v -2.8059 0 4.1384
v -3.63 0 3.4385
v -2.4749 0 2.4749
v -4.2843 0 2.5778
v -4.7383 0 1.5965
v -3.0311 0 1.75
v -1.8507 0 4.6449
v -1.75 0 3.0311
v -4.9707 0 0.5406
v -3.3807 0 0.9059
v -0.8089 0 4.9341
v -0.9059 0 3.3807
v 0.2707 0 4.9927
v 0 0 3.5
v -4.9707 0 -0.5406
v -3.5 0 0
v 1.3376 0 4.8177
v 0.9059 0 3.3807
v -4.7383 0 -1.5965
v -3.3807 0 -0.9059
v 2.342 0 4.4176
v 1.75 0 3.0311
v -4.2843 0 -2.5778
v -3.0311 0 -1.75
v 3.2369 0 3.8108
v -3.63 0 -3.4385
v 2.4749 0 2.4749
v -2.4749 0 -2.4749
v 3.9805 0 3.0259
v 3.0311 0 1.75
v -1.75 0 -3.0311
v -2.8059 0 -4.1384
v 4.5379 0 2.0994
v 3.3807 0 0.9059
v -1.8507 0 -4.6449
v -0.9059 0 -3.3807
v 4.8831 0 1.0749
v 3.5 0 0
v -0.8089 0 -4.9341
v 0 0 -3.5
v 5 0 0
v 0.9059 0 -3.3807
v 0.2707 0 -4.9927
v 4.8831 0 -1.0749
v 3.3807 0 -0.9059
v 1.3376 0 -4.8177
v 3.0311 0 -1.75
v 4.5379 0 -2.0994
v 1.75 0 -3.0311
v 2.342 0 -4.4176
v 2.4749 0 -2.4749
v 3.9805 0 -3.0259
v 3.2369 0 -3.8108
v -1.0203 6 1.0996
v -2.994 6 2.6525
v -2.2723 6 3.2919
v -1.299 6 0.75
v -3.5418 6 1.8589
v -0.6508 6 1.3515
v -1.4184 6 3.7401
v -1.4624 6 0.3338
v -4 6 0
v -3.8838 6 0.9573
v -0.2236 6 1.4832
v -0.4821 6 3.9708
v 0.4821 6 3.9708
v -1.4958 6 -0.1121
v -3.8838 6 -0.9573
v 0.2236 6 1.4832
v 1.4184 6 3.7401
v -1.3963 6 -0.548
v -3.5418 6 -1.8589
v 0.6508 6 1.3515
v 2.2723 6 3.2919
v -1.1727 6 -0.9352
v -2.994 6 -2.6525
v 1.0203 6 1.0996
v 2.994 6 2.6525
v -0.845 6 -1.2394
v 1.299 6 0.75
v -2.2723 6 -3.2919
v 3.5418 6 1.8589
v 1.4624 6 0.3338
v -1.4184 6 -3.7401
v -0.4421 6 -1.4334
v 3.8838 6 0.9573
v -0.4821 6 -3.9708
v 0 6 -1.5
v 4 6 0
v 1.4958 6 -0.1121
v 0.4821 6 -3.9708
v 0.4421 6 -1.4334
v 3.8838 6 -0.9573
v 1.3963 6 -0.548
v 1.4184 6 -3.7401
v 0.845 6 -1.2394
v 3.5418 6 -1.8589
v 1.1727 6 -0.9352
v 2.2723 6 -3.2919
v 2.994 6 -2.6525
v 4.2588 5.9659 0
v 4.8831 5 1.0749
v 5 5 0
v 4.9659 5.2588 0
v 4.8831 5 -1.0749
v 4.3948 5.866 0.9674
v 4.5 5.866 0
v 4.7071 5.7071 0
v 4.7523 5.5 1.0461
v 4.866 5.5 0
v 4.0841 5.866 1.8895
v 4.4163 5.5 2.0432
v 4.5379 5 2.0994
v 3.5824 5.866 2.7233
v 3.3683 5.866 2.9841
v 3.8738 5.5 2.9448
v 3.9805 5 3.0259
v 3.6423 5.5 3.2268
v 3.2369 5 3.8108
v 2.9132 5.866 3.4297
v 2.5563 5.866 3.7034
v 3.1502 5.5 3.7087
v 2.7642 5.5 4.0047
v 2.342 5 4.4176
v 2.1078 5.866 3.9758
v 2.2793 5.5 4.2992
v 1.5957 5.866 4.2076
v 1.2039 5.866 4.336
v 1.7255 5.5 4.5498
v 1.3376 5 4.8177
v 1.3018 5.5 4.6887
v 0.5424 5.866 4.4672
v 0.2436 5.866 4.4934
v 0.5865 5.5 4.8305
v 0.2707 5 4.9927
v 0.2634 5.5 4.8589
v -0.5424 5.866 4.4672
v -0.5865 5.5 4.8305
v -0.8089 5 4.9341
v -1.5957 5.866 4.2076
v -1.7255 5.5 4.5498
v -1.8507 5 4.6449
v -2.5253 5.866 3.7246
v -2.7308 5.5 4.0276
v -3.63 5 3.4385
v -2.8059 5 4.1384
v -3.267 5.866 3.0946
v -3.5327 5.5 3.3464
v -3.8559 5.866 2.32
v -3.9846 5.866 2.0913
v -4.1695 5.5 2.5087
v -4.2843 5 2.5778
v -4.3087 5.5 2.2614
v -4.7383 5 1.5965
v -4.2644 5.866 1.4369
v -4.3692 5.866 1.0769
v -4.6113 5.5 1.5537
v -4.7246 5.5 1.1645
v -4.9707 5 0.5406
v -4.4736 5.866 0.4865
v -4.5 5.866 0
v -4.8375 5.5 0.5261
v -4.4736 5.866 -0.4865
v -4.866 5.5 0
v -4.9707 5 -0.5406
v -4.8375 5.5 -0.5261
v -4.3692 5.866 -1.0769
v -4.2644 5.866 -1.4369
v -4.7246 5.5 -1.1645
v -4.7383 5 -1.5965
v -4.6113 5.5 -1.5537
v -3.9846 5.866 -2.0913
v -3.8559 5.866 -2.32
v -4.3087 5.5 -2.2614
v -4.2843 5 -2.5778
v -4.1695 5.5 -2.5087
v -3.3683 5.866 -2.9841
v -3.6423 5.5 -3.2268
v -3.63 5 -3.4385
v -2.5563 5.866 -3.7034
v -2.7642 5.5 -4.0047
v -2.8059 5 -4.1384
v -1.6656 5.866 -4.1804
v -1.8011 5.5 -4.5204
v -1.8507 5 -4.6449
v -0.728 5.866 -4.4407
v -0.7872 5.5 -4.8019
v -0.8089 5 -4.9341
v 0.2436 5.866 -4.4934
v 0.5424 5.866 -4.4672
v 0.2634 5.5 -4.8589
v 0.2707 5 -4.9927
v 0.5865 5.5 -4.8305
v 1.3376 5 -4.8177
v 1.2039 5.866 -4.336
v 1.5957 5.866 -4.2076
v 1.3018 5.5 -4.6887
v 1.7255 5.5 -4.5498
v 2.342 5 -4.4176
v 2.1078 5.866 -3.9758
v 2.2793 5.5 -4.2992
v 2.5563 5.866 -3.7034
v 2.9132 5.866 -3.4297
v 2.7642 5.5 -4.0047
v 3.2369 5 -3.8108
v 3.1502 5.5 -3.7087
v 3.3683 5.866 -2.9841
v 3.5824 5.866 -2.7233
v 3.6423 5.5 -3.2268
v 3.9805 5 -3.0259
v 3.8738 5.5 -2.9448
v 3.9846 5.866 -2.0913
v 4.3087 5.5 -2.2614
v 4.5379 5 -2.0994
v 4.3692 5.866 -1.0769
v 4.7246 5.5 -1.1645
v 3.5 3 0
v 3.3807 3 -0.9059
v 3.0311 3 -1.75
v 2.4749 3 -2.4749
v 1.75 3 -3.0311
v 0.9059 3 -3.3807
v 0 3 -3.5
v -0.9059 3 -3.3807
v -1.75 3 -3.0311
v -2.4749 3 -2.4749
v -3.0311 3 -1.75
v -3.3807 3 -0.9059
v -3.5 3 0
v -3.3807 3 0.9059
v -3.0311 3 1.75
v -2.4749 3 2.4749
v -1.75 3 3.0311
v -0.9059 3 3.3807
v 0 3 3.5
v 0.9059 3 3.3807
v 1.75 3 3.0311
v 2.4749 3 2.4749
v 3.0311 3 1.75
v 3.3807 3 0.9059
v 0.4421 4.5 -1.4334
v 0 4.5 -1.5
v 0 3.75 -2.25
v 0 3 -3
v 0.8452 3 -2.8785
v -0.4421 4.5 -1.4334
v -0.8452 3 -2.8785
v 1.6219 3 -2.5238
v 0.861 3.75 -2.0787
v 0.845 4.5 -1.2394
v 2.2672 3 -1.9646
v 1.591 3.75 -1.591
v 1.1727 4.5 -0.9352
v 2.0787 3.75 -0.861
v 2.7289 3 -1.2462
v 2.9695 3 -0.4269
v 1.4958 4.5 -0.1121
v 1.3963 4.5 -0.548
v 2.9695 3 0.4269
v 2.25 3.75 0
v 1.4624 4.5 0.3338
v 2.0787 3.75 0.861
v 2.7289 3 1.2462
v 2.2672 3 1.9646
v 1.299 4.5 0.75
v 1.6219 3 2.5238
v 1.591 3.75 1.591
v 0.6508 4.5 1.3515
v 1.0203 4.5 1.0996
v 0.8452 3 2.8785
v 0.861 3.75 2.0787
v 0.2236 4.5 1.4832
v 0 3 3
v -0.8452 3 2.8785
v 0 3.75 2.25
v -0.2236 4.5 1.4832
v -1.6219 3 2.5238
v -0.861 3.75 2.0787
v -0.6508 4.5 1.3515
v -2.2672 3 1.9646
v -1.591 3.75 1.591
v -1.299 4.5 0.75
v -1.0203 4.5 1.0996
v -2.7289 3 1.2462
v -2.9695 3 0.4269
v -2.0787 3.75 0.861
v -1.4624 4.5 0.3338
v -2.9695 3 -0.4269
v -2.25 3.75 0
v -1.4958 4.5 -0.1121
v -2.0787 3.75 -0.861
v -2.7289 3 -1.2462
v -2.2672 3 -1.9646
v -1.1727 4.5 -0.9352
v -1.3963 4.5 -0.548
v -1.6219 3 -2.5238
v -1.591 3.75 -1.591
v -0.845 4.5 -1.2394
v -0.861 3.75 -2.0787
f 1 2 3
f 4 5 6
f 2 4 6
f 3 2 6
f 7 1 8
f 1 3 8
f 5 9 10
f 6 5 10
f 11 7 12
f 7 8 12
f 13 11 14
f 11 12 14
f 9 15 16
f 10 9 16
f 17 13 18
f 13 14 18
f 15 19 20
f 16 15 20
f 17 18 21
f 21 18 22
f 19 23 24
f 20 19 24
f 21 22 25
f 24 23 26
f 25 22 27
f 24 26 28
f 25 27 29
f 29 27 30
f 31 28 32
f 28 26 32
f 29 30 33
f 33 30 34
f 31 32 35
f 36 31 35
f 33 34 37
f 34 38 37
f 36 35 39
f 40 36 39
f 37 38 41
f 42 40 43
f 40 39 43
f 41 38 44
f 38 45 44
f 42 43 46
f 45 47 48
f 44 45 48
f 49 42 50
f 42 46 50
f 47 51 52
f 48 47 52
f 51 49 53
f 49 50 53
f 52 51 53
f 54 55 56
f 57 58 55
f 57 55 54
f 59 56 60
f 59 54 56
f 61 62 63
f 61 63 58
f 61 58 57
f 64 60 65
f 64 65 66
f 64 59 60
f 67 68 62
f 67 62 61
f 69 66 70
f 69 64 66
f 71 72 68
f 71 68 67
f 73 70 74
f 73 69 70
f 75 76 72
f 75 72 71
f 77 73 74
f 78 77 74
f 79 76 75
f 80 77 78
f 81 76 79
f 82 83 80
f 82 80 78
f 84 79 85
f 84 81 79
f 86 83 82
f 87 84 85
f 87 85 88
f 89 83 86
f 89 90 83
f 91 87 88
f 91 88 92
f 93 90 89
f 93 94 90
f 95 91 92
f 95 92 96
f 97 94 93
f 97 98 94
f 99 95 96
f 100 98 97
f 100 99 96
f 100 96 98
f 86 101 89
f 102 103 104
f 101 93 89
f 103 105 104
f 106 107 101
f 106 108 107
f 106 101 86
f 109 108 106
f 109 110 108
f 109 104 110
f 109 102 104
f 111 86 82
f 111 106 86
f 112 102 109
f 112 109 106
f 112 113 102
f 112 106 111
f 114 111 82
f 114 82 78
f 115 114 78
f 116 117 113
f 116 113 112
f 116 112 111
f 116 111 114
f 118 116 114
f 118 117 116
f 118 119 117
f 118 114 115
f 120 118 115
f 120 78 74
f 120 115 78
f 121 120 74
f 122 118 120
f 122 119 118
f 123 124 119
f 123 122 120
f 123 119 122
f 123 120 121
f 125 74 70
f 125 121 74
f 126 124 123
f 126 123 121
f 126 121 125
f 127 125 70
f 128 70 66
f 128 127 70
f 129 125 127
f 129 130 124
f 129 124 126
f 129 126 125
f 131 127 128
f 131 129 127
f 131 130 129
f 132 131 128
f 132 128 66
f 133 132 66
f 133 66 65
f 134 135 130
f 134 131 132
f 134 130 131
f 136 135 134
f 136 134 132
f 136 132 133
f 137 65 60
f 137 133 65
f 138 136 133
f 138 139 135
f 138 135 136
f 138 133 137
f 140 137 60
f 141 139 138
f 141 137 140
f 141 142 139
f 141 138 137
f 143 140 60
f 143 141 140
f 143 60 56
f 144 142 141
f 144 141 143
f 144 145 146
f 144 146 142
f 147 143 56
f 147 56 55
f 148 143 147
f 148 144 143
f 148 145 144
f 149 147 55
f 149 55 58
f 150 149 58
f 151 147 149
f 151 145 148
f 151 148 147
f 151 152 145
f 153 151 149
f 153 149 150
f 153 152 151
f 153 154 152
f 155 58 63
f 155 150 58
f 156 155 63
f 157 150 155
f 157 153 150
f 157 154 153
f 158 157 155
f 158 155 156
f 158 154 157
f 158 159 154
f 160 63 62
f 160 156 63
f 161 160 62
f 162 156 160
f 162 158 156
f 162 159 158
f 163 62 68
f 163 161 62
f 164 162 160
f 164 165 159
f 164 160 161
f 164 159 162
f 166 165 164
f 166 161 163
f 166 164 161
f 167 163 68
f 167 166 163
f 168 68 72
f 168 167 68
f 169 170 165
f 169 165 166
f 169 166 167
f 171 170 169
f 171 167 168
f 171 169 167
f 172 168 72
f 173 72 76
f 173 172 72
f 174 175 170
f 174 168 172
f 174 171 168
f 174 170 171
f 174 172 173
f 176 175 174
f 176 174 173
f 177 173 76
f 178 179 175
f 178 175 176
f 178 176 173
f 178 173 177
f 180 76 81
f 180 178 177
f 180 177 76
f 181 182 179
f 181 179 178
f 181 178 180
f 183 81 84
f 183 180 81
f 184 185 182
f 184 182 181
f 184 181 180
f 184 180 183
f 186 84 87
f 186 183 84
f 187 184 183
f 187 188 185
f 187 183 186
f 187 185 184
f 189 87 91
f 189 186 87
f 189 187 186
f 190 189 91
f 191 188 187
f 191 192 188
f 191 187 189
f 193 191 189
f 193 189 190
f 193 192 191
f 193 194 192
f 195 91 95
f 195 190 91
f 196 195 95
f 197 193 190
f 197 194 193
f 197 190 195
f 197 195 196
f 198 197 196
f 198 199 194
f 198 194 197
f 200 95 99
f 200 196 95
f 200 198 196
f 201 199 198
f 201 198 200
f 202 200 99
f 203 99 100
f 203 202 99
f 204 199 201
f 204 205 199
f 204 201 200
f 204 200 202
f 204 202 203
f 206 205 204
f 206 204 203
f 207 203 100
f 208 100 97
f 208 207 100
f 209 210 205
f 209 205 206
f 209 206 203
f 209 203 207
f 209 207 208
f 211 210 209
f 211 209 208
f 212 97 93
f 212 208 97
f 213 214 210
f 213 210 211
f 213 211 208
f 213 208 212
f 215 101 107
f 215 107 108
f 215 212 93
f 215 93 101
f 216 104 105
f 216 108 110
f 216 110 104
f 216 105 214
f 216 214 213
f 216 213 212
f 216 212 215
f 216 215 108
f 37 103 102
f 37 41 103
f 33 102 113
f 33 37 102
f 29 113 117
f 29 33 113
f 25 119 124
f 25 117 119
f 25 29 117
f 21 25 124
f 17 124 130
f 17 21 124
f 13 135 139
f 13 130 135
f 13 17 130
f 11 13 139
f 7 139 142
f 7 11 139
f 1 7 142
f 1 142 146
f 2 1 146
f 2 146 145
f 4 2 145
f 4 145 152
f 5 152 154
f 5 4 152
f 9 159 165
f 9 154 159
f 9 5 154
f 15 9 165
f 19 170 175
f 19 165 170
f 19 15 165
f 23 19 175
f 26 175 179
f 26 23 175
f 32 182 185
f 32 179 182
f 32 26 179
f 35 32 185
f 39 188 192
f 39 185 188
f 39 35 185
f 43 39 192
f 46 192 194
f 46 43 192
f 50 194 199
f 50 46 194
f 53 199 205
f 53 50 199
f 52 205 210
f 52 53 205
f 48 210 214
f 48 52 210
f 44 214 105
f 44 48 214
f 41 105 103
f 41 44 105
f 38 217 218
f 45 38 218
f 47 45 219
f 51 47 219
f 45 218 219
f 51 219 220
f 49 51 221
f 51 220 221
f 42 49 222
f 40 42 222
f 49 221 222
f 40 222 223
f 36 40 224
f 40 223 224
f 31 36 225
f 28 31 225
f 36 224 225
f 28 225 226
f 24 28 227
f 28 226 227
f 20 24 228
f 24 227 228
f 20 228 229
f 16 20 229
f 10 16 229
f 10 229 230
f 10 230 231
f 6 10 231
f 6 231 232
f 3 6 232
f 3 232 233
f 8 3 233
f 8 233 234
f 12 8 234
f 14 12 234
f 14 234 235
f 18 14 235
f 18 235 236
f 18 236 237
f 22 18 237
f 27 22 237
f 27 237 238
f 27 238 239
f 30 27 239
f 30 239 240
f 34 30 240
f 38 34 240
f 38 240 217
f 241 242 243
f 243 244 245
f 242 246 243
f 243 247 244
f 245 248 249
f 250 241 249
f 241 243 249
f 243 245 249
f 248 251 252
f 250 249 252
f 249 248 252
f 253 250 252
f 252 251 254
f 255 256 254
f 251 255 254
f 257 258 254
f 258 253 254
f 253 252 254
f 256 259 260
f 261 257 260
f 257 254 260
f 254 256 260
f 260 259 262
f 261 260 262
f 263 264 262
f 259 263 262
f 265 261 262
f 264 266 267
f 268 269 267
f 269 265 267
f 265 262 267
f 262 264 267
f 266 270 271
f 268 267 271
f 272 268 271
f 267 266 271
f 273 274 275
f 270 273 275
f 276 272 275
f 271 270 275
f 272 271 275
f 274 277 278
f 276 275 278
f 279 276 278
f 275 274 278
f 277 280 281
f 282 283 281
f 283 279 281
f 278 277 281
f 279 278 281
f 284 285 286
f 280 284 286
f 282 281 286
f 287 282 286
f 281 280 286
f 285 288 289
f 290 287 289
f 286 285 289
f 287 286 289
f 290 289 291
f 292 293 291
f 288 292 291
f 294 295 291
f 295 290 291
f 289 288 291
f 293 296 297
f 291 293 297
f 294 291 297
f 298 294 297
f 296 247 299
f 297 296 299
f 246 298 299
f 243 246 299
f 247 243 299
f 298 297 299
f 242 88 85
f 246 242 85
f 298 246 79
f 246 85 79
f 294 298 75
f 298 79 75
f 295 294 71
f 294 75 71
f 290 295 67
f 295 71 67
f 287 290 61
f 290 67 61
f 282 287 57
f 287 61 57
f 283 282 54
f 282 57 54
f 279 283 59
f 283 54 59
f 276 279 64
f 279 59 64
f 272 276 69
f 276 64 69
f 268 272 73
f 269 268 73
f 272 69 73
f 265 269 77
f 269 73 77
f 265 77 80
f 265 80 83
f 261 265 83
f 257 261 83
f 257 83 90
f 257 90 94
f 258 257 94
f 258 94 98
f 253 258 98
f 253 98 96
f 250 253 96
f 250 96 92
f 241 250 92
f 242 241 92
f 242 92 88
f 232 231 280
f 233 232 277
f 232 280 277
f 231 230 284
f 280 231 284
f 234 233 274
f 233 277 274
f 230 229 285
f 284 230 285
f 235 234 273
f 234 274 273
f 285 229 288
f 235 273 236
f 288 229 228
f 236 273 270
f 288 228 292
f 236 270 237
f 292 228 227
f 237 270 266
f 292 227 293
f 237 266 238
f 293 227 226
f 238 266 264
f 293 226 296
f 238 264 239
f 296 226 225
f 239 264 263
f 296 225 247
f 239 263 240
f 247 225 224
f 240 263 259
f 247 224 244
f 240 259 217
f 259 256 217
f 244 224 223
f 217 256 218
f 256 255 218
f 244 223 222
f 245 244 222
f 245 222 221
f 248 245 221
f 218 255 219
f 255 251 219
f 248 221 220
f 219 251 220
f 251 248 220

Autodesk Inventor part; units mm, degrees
ref_plane "YZ Plane" through (0, 0, 0) normal (1, 0, 0) x (0, 1, 0)
ref_plane "XZ Plane" through (0, 0, 0) normal (0, 1, 0) x (-1, 0, 0)
ref_plane "XY Plane" through (0, 0, 0) normal (0, 0, 1) x (1, 0, 0)
sketch "Sketch1" plane through (0, 0, 0) normal (0, 0, 1) x (1, 0, 0)
  line L0 (0, 0) -> (0, 6)
  line L1 (0, 6) -> (5, 6)
  line L2 (5, 6) -> (5, 0)
  line L3 (5, 0) -> (3.5, 0)
  line L4 (3.5, 0) -> (3.5, 3)
  line L5 (3.5, 3) -> (0, 3)
  point P0 (4.25, 0)
  dimension "d0" = 7
  dimension "d1" = 10
  dimension "d2" = 3
  dimension "d3" = 6
revolve "Revolution1" add sketch "Sketch1" angle 360 about axis through (0, 0, 0) along (0, 1, 0)
sketch "Sketch2" plane through (0, 3, 0) normal (0, -1, 0) x (1, 0, 0)
  circle A0 centre (0, 0) radius 3.5 projected
hole "Hole1" at (0, 3, 0) direction (0, 1, 0) diameter 3 depth 3 countersink diameter 6 countersink angle 90
fillet "Fillet1" radius 1 1 edges at (-5, 6, 0)
properties part number "26b"
